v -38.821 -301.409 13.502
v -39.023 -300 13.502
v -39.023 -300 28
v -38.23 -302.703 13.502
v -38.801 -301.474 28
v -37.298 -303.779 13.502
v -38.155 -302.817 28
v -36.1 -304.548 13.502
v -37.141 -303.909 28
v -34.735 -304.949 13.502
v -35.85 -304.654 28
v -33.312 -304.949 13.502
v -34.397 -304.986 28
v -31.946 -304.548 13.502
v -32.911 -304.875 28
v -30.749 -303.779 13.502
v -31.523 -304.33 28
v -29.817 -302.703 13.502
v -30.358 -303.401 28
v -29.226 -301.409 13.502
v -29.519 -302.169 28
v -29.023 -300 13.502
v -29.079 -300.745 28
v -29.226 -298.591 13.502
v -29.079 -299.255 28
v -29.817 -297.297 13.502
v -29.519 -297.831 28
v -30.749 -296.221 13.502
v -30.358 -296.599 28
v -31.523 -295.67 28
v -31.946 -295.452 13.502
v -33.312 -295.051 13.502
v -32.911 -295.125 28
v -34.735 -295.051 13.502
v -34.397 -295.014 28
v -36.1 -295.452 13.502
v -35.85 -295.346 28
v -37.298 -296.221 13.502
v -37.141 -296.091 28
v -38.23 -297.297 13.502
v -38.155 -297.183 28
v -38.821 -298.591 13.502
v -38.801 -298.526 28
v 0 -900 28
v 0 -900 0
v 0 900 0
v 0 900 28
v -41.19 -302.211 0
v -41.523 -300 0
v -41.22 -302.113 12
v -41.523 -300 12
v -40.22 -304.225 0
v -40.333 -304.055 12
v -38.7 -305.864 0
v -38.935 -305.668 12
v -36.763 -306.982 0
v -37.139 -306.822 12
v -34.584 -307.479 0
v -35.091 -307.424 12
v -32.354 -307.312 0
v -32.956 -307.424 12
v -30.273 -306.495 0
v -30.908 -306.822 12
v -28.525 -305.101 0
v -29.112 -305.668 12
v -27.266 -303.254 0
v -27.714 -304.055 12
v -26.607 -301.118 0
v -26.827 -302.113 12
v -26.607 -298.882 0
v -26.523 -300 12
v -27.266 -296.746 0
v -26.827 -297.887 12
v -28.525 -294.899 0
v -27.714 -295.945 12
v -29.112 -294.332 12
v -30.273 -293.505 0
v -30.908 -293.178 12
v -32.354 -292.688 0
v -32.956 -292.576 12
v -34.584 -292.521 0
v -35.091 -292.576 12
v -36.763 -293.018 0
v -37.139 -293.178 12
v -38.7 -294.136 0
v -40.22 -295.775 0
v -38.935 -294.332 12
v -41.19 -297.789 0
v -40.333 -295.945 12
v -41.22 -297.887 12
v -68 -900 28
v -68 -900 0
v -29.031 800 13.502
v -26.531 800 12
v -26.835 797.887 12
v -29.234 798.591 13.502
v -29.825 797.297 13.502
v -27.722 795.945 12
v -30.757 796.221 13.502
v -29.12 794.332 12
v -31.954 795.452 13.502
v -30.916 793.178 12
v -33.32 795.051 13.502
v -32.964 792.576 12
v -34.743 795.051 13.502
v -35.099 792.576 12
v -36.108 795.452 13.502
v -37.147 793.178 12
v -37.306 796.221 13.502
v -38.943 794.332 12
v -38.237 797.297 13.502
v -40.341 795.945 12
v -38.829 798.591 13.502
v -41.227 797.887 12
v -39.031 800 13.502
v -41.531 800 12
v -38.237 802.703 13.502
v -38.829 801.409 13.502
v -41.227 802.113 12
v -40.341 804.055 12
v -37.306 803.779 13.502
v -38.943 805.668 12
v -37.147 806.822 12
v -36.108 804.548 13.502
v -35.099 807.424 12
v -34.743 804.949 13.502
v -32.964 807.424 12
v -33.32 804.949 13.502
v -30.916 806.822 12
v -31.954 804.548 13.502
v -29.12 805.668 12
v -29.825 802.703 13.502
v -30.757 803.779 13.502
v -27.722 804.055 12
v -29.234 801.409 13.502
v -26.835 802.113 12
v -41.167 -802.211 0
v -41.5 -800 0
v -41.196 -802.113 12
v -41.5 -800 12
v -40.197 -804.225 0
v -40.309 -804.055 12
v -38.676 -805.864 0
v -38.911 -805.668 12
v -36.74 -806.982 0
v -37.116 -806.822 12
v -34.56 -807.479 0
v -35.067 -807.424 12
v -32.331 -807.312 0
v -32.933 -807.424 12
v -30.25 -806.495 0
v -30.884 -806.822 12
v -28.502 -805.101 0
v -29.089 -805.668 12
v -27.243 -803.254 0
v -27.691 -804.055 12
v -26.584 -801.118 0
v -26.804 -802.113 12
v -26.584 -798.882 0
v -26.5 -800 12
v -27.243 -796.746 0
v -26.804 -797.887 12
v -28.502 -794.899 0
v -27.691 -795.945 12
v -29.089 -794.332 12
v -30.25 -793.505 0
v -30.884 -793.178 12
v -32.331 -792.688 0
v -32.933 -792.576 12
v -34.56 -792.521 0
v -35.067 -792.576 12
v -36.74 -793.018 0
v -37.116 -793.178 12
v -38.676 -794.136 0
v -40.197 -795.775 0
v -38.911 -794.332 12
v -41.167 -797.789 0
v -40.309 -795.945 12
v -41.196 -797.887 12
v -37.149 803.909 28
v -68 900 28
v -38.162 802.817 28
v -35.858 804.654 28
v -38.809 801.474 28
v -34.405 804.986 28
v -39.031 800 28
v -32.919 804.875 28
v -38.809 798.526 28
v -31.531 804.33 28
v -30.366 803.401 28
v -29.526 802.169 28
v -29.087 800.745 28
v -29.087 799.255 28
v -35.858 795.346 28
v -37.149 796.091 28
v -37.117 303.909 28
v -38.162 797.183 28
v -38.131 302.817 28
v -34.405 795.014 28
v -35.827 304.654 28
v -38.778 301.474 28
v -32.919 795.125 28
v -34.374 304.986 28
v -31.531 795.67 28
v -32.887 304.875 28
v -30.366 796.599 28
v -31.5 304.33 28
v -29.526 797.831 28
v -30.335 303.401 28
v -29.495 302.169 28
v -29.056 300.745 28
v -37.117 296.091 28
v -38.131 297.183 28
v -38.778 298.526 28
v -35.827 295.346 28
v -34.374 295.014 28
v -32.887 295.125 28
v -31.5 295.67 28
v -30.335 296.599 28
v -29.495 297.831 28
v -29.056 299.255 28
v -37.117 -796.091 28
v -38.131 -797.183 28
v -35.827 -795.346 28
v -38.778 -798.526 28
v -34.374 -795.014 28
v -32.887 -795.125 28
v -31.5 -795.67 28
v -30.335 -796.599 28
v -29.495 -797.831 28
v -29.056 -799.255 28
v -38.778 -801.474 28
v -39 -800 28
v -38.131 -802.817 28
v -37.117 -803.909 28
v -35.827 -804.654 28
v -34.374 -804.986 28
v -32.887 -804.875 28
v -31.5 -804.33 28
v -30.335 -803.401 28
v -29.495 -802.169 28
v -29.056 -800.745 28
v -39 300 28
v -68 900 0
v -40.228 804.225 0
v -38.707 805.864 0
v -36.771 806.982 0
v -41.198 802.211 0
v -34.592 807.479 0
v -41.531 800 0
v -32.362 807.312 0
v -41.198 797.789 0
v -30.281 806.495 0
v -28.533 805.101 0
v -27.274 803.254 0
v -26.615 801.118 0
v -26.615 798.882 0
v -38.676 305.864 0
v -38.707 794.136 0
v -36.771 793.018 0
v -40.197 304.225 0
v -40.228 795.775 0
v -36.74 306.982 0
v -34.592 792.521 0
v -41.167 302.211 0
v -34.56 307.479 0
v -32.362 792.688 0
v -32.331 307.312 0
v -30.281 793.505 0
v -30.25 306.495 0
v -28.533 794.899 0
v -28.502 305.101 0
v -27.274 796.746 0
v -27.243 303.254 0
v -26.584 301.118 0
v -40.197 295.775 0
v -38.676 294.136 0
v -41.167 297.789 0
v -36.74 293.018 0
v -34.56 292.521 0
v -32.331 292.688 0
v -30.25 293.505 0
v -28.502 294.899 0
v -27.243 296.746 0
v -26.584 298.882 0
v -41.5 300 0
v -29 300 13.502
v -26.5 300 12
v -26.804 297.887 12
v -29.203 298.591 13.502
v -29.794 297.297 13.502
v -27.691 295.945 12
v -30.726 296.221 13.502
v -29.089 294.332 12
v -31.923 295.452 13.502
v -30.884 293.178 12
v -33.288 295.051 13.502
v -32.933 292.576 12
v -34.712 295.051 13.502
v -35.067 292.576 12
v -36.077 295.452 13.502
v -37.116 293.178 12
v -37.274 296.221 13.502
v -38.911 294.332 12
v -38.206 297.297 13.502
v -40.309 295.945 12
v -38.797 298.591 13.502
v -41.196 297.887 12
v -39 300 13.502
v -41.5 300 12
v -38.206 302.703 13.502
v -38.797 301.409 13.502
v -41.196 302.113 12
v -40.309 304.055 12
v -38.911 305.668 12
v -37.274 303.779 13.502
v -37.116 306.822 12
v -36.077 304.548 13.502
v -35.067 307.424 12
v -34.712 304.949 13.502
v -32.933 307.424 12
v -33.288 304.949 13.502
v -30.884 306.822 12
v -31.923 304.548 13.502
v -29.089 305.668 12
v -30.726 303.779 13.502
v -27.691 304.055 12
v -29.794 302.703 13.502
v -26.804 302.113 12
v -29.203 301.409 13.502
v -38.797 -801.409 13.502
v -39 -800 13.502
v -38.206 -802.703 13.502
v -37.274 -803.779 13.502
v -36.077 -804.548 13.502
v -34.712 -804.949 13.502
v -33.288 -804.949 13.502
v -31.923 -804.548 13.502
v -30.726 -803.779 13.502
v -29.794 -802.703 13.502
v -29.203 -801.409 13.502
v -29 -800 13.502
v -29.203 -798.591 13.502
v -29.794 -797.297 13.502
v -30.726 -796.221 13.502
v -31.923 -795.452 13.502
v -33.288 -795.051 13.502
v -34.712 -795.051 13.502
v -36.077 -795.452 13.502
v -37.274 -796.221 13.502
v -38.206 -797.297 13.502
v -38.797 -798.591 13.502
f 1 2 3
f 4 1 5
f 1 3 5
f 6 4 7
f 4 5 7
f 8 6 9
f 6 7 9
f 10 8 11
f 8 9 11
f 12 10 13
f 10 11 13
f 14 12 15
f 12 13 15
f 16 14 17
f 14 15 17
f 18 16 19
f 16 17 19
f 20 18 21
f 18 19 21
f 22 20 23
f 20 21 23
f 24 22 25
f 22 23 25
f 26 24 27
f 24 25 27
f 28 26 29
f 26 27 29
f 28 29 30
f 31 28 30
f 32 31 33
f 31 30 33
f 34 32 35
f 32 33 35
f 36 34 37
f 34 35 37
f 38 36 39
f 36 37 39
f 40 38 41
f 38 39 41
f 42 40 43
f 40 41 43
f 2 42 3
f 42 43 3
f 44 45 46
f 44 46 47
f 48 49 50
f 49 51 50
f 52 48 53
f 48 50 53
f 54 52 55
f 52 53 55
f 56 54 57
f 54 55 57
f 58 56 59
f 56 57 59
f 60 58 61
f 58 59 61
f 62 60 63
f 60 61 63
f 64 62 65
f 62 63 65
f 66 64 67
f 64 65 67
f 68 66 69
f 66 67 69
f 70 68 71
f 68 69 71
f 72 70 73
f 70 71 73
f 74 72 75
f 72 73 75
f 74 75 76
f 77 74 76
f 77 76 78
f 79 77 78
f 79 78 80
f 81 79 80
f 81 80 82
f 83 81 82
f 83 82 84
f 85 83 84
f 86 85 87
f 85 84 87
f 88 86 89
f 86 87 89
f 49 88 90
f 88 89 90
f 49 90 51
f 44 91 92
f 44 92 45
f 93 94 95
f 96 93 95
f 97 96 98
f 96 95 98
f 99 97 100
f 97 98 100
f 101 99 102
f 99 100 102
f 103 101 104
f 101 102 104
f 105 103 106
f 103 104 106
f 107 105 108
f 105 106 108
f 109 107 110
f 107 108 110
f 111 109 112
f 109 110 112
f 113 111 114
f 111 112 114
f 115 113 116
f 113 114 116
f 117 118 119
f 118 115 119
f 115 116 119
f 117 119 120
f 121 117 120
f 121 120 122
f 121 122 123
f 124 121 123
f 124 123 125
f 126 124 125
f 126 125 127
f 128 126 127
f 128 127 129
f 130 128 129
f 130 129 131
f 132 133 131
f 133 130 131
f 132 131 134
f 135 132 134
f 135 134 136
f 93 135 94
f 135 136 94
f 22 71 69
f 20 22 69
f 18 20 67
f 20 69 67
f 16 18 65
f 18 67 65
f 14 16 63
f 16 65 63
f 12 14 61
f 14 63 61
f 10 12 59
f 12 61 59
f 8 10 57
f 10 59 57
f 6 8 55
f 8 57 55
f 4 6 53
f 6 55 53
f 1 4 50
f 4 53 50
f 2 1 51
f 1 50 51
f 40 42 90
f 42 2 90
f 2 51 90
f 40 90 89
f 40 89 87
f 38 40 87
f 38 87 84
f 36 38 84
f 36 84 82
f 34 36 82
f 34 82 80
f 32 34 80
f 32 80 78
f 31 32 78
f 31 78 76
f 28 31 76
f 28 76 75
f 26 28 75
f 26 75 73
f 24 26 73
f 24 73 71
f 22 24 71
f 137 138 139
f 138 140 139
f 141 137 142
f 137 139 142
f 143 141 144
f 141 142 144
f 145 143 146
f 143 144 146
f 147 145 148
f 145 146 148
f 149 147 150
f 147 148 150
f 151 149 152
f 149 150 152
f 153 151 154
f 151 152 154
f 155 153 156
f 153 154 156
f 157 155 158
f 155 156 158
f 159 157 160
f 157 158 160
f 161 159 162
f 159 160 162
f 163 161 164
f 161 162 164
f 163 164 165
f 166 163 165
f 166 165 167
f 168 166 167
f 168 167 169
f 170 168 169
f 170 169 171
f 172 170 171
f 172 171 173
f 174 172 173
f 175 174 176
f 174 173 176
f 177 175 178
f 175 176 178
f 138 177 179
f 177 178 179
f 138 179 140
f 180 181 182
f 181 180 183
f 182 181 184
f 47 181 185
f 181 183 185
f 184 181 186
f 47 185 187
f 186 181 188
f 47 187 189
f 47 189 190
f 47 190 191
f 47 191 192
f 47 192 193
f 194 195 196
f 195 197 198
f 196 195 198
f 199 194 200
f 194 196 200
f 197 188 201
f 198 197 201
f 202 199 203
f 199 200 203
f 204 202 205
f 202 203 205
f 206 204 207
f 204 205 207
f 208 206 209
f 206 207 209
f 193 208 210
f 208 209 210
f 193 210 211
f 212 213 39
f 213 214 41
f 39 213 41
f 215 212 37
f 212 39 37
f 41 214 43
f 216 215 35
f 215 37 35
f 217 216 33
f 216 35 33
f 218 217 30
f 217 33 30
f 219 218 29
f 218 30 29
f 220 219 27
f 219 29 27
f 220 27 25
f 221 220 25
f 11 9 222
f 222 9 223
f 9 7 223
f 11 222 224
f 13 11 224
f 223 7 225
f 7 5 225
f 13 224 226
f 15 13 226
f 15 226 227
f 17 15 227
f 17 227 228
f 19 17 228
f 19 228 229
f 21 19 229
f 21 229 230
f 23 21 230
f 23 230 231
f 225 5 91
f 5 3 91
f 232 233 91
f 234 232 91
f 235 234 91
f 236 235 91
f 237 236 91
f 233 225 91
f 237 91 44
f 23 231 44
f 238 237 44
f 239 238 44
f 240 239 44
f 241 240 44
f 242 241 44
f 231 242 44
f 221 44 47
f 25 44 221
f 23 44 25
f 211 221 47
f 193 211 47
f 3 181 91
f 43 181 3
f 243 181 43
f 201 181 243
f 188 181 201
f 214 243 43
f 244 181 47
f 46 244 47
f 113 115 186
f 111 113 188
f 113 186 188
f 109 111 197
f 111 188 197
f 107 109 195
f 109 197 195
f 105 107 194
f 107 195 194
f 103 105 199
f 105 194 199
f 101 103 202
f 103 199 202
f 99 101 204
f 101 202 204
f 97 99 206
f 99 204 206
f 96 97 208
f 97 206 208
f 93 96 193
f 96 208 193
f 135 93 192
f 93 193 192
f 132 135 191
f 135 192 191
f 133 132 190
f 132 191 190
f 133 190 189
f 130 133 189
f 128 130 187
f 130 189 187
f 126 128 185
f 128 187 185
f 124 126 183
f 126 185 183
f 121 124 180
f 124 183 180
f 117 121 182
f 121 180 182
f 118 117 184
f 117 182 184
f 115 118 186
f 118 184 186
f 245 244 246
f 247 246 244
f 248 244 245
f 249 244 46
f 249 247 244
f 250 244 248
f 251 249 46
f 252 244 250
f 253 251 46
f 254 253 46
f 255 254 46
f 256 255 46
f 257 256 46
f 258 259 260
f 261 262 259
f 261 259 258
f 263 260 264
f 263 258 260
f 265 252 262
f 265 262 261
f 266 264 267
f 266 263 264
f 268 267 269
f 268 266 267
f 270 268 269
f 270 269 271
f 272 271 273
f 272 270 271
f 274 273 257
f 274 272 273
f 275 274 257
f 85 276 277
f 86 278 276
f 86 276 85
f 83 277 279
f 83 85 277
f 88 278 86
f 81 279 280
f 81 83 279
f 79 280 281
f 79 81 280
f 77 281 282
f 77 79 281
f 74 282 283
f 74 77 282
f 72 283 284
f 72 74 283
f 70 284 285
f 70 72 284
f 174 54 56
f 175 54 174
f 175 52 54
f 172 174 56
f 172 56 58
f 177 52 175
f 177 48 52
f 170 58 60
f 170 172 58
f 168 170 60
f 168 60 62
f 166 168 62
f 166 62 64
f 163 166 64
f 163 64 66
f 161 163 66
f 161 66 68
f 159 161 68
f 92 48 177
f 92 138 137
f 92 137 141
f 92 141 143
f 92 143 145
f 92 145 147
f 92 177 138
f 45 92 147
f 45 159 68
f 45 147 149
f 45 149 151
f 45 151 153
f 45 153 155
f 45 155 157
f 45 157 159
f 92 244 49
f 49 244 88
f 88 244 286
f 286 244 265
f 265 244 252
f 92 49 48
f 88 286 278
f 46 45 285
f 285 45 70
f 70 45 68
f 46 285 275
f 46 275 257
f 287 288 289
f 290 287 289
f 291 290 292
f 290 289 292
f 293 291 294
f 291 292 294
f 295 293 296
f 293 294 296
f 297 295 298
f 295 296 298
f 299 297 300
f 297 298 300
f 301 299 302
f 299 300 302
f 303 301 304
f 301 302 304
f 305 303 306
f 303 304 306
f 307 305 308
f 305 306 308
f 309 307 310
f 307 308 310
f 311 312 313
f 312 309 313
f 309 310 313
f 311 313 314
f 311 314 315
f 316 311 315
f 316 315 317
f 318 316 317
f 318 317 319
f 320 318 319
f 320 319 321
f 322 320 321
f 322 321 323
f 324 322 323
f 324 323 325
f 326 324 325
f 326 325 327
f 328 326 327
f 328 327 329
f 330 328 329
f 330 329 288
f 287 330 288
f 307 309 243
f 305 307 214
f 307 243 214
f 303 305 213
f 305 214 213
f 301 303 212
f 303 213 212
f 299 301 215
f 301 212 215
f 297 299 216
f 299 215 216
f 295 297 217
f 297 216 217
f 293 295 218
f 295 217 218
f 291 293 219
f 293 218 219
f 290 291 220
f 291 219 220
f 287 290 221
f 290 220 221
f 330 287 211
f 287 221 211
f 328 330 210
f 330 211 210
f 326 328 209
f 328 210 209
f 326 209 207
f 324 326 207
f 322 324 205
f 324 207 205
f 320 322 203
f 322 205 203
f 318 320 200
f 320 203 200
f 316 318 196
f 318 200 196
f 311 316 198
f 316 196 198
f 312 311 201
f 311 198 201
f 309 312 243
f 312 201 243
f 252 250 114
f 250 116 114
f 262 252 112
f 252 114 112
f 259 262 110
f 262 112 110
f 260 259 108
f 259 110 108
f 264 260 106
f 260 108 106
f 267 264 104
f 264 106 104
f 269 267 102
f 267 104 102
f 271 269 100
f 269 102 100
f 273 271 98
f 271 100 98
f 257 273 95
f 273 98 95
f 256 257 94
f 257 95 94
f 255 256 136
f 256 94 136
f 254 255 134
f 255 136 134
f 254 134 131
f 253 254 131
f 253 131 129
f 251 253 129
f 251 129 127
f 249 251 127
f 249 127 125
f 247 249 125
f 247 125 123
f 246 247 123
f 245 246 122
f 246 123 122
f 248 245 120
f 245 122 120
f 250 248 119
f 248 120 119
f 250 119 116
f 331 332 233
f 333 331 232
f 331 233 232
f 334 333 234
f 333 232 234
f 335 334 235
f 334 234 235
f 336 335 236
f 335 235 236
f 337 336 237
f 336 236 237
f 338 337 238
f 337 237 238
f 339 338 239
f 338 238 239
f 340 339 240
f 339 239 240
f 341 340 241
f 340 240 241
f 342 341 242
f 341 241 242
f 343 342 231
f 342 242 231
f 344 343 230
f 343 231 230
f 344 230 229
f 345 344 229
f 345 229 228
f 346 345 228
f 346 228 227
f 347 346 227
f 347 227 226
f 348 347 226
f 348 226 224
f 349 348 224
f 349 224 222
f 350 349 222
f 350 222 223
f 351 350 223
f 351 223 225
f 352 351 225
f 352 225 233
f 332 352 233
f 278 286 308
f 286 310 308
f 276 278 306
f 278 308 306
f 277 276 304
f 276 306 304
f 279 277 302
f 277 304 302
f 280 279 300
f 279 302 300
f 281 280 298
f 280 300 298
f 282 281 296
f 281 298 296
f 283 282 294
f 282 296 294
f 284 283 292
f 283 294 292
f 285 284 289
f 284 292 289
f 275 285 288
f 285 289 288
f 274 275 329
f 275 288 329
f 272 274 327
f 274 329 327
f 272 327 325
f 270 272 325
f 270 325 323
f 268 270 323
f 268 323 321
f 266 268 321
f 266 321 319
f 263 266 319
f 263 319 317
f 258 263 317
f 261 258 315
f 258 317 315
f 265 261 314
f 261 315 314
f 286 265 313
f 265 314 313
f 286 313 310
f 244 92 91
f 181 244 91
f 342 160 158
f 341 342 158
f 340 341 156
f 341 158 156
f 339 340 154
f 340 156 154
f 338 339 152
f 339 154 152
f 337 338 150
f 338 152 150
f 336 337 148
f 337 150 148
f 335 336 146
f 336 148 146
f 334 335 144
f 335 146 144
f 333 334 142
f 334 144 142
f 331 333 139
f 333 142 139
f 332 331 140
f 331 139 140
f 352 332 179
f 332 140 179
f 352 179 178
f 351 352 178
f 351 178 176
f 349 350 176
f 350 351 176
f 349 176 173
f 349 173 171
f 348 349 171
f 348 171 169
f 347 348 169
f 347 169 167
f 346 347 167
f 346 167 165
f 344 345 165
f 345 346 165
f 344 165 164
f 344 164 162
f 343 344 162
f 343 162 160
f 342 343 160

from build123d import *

# Parameters (mm, degrees)
F0_W      = 68
F0_H      = 28
F1_DEPTH  = 900
F3_D      = 10
F4_D      = 15
F4_DEPTH  = 12
F4_TIP    = 4.5064546427
F5_D      = 10
F6_D      = 15
F6_DEPTH  = 12
F6_TIP    = 4.5064546427
F7_D      = 15
F7_DEPTH  = 12
F7_TIP    = 4.5064546427
F8_D      = 10
F9_D      = 10
F10_D     = 15
F10_DEPTH = 12
F10_TIP   = 4.5064546427


with BuildPart() as f1:
    # F0 (on Front) → F1 (new body, symmetric)
    with BuildSketch(Plane.XZ):
        with Locations((-34, 14)):
            Rectangle(F0_W, F0_H)
    extrude(amount=F1_DEPTH, both=True)

    # F3 (through all)
    with Locations(Plane(origin=(0, 0, 0), x_dir=(1, 0, 0), z_dir=(0, 0, -1))):
        with Locations((-34.0233631432, 300)):
            Hole(F3_D / 2)

    # F4
    with Locations(Plane(origin=(0, 0, 0), x_dir=(1, 0, 0), z_dir=(0, 0, -1))):
        with Locations((-34.0233631432, 300)):
            Hole(F4_D / 2, depth=F4_DEPTH)
            with Locations((0, 0, -(F4_DEPTH + F4_TIP / 2))):  # 118° drill point
                Cone(0, F4_D / 2, F4_TIP, mode=Mode.SUBTRACT)

    # F5 (through all)
    with Locations(Plane(origin=(0, 0, 0), x_dir=(1, 0, 0), z_dir=(0, 0, -1))):
        with Locations((-34, -300)):
            Hole(F5_D / 2)

    # F6
    with Locations(Plane(origin=(0, 0, 0), x_dir=(1, 0, 0), z_dir=(0, 0, -1))):
        with Locations((-34, -300)):
            Hole(F6_D / 2, depth=F6_DEPTH)
            with Locations((0, 0, -(F6_DEPTH + F6_TIP / 2))):  # 118° drill point
                Cone(0, F6_D / 2, F6_TIP, mode=Mode.SUBTRACT)

    # F7
    with Locations(Plane(origin=(0, 0, 0), x_dir=(1, 0, 0), z_dir=(0, 0, -1))):
        with Locations((-34, 800)):
            Hole(F7_D / 2, depth=F7_DEPTH)
            with Locations((0, 0, -(F7_DEPTH + F7_TIP / 2))):  # 118° drill point
                Cone(0, F7_D / 2, F7_TIP, mode=Mode.SUBTRACT)

    # F8 (through all)
    with Locations(Plane(origin=(0, 0, 0), x_dir=(1, 0, 0), z_dir=(0, 0, -1))):
        with Locations((-34, 800)):
            Hole(F8_D / 2)

    # F9 (through all)
    with Locations(Plane(origin=(0, 0, 0), x_dir=(1, 0, 0), z_dir=(0, 0, -1))):
        with Locations((-34.0312086046, -800)):
            Hole(F9_D / 2)

    # F10
    with Locations(Plane(origin=(0, 0, 0), x_dir=(1, 0, 0), z_dir=(0, 0, -1))):
        with Locations((-34.0312086046, -800)):
            Hole(F10_D / 2, depth=F10_DEPTH)
            with Locations((0, 0, -(F10_DEPTH + F10_TIP / 2))):  # 118° drill point
                Cone(0, F10_D / 2, F10_TIP, mode=Mode.SUBTRACT)


solid = f1.part
